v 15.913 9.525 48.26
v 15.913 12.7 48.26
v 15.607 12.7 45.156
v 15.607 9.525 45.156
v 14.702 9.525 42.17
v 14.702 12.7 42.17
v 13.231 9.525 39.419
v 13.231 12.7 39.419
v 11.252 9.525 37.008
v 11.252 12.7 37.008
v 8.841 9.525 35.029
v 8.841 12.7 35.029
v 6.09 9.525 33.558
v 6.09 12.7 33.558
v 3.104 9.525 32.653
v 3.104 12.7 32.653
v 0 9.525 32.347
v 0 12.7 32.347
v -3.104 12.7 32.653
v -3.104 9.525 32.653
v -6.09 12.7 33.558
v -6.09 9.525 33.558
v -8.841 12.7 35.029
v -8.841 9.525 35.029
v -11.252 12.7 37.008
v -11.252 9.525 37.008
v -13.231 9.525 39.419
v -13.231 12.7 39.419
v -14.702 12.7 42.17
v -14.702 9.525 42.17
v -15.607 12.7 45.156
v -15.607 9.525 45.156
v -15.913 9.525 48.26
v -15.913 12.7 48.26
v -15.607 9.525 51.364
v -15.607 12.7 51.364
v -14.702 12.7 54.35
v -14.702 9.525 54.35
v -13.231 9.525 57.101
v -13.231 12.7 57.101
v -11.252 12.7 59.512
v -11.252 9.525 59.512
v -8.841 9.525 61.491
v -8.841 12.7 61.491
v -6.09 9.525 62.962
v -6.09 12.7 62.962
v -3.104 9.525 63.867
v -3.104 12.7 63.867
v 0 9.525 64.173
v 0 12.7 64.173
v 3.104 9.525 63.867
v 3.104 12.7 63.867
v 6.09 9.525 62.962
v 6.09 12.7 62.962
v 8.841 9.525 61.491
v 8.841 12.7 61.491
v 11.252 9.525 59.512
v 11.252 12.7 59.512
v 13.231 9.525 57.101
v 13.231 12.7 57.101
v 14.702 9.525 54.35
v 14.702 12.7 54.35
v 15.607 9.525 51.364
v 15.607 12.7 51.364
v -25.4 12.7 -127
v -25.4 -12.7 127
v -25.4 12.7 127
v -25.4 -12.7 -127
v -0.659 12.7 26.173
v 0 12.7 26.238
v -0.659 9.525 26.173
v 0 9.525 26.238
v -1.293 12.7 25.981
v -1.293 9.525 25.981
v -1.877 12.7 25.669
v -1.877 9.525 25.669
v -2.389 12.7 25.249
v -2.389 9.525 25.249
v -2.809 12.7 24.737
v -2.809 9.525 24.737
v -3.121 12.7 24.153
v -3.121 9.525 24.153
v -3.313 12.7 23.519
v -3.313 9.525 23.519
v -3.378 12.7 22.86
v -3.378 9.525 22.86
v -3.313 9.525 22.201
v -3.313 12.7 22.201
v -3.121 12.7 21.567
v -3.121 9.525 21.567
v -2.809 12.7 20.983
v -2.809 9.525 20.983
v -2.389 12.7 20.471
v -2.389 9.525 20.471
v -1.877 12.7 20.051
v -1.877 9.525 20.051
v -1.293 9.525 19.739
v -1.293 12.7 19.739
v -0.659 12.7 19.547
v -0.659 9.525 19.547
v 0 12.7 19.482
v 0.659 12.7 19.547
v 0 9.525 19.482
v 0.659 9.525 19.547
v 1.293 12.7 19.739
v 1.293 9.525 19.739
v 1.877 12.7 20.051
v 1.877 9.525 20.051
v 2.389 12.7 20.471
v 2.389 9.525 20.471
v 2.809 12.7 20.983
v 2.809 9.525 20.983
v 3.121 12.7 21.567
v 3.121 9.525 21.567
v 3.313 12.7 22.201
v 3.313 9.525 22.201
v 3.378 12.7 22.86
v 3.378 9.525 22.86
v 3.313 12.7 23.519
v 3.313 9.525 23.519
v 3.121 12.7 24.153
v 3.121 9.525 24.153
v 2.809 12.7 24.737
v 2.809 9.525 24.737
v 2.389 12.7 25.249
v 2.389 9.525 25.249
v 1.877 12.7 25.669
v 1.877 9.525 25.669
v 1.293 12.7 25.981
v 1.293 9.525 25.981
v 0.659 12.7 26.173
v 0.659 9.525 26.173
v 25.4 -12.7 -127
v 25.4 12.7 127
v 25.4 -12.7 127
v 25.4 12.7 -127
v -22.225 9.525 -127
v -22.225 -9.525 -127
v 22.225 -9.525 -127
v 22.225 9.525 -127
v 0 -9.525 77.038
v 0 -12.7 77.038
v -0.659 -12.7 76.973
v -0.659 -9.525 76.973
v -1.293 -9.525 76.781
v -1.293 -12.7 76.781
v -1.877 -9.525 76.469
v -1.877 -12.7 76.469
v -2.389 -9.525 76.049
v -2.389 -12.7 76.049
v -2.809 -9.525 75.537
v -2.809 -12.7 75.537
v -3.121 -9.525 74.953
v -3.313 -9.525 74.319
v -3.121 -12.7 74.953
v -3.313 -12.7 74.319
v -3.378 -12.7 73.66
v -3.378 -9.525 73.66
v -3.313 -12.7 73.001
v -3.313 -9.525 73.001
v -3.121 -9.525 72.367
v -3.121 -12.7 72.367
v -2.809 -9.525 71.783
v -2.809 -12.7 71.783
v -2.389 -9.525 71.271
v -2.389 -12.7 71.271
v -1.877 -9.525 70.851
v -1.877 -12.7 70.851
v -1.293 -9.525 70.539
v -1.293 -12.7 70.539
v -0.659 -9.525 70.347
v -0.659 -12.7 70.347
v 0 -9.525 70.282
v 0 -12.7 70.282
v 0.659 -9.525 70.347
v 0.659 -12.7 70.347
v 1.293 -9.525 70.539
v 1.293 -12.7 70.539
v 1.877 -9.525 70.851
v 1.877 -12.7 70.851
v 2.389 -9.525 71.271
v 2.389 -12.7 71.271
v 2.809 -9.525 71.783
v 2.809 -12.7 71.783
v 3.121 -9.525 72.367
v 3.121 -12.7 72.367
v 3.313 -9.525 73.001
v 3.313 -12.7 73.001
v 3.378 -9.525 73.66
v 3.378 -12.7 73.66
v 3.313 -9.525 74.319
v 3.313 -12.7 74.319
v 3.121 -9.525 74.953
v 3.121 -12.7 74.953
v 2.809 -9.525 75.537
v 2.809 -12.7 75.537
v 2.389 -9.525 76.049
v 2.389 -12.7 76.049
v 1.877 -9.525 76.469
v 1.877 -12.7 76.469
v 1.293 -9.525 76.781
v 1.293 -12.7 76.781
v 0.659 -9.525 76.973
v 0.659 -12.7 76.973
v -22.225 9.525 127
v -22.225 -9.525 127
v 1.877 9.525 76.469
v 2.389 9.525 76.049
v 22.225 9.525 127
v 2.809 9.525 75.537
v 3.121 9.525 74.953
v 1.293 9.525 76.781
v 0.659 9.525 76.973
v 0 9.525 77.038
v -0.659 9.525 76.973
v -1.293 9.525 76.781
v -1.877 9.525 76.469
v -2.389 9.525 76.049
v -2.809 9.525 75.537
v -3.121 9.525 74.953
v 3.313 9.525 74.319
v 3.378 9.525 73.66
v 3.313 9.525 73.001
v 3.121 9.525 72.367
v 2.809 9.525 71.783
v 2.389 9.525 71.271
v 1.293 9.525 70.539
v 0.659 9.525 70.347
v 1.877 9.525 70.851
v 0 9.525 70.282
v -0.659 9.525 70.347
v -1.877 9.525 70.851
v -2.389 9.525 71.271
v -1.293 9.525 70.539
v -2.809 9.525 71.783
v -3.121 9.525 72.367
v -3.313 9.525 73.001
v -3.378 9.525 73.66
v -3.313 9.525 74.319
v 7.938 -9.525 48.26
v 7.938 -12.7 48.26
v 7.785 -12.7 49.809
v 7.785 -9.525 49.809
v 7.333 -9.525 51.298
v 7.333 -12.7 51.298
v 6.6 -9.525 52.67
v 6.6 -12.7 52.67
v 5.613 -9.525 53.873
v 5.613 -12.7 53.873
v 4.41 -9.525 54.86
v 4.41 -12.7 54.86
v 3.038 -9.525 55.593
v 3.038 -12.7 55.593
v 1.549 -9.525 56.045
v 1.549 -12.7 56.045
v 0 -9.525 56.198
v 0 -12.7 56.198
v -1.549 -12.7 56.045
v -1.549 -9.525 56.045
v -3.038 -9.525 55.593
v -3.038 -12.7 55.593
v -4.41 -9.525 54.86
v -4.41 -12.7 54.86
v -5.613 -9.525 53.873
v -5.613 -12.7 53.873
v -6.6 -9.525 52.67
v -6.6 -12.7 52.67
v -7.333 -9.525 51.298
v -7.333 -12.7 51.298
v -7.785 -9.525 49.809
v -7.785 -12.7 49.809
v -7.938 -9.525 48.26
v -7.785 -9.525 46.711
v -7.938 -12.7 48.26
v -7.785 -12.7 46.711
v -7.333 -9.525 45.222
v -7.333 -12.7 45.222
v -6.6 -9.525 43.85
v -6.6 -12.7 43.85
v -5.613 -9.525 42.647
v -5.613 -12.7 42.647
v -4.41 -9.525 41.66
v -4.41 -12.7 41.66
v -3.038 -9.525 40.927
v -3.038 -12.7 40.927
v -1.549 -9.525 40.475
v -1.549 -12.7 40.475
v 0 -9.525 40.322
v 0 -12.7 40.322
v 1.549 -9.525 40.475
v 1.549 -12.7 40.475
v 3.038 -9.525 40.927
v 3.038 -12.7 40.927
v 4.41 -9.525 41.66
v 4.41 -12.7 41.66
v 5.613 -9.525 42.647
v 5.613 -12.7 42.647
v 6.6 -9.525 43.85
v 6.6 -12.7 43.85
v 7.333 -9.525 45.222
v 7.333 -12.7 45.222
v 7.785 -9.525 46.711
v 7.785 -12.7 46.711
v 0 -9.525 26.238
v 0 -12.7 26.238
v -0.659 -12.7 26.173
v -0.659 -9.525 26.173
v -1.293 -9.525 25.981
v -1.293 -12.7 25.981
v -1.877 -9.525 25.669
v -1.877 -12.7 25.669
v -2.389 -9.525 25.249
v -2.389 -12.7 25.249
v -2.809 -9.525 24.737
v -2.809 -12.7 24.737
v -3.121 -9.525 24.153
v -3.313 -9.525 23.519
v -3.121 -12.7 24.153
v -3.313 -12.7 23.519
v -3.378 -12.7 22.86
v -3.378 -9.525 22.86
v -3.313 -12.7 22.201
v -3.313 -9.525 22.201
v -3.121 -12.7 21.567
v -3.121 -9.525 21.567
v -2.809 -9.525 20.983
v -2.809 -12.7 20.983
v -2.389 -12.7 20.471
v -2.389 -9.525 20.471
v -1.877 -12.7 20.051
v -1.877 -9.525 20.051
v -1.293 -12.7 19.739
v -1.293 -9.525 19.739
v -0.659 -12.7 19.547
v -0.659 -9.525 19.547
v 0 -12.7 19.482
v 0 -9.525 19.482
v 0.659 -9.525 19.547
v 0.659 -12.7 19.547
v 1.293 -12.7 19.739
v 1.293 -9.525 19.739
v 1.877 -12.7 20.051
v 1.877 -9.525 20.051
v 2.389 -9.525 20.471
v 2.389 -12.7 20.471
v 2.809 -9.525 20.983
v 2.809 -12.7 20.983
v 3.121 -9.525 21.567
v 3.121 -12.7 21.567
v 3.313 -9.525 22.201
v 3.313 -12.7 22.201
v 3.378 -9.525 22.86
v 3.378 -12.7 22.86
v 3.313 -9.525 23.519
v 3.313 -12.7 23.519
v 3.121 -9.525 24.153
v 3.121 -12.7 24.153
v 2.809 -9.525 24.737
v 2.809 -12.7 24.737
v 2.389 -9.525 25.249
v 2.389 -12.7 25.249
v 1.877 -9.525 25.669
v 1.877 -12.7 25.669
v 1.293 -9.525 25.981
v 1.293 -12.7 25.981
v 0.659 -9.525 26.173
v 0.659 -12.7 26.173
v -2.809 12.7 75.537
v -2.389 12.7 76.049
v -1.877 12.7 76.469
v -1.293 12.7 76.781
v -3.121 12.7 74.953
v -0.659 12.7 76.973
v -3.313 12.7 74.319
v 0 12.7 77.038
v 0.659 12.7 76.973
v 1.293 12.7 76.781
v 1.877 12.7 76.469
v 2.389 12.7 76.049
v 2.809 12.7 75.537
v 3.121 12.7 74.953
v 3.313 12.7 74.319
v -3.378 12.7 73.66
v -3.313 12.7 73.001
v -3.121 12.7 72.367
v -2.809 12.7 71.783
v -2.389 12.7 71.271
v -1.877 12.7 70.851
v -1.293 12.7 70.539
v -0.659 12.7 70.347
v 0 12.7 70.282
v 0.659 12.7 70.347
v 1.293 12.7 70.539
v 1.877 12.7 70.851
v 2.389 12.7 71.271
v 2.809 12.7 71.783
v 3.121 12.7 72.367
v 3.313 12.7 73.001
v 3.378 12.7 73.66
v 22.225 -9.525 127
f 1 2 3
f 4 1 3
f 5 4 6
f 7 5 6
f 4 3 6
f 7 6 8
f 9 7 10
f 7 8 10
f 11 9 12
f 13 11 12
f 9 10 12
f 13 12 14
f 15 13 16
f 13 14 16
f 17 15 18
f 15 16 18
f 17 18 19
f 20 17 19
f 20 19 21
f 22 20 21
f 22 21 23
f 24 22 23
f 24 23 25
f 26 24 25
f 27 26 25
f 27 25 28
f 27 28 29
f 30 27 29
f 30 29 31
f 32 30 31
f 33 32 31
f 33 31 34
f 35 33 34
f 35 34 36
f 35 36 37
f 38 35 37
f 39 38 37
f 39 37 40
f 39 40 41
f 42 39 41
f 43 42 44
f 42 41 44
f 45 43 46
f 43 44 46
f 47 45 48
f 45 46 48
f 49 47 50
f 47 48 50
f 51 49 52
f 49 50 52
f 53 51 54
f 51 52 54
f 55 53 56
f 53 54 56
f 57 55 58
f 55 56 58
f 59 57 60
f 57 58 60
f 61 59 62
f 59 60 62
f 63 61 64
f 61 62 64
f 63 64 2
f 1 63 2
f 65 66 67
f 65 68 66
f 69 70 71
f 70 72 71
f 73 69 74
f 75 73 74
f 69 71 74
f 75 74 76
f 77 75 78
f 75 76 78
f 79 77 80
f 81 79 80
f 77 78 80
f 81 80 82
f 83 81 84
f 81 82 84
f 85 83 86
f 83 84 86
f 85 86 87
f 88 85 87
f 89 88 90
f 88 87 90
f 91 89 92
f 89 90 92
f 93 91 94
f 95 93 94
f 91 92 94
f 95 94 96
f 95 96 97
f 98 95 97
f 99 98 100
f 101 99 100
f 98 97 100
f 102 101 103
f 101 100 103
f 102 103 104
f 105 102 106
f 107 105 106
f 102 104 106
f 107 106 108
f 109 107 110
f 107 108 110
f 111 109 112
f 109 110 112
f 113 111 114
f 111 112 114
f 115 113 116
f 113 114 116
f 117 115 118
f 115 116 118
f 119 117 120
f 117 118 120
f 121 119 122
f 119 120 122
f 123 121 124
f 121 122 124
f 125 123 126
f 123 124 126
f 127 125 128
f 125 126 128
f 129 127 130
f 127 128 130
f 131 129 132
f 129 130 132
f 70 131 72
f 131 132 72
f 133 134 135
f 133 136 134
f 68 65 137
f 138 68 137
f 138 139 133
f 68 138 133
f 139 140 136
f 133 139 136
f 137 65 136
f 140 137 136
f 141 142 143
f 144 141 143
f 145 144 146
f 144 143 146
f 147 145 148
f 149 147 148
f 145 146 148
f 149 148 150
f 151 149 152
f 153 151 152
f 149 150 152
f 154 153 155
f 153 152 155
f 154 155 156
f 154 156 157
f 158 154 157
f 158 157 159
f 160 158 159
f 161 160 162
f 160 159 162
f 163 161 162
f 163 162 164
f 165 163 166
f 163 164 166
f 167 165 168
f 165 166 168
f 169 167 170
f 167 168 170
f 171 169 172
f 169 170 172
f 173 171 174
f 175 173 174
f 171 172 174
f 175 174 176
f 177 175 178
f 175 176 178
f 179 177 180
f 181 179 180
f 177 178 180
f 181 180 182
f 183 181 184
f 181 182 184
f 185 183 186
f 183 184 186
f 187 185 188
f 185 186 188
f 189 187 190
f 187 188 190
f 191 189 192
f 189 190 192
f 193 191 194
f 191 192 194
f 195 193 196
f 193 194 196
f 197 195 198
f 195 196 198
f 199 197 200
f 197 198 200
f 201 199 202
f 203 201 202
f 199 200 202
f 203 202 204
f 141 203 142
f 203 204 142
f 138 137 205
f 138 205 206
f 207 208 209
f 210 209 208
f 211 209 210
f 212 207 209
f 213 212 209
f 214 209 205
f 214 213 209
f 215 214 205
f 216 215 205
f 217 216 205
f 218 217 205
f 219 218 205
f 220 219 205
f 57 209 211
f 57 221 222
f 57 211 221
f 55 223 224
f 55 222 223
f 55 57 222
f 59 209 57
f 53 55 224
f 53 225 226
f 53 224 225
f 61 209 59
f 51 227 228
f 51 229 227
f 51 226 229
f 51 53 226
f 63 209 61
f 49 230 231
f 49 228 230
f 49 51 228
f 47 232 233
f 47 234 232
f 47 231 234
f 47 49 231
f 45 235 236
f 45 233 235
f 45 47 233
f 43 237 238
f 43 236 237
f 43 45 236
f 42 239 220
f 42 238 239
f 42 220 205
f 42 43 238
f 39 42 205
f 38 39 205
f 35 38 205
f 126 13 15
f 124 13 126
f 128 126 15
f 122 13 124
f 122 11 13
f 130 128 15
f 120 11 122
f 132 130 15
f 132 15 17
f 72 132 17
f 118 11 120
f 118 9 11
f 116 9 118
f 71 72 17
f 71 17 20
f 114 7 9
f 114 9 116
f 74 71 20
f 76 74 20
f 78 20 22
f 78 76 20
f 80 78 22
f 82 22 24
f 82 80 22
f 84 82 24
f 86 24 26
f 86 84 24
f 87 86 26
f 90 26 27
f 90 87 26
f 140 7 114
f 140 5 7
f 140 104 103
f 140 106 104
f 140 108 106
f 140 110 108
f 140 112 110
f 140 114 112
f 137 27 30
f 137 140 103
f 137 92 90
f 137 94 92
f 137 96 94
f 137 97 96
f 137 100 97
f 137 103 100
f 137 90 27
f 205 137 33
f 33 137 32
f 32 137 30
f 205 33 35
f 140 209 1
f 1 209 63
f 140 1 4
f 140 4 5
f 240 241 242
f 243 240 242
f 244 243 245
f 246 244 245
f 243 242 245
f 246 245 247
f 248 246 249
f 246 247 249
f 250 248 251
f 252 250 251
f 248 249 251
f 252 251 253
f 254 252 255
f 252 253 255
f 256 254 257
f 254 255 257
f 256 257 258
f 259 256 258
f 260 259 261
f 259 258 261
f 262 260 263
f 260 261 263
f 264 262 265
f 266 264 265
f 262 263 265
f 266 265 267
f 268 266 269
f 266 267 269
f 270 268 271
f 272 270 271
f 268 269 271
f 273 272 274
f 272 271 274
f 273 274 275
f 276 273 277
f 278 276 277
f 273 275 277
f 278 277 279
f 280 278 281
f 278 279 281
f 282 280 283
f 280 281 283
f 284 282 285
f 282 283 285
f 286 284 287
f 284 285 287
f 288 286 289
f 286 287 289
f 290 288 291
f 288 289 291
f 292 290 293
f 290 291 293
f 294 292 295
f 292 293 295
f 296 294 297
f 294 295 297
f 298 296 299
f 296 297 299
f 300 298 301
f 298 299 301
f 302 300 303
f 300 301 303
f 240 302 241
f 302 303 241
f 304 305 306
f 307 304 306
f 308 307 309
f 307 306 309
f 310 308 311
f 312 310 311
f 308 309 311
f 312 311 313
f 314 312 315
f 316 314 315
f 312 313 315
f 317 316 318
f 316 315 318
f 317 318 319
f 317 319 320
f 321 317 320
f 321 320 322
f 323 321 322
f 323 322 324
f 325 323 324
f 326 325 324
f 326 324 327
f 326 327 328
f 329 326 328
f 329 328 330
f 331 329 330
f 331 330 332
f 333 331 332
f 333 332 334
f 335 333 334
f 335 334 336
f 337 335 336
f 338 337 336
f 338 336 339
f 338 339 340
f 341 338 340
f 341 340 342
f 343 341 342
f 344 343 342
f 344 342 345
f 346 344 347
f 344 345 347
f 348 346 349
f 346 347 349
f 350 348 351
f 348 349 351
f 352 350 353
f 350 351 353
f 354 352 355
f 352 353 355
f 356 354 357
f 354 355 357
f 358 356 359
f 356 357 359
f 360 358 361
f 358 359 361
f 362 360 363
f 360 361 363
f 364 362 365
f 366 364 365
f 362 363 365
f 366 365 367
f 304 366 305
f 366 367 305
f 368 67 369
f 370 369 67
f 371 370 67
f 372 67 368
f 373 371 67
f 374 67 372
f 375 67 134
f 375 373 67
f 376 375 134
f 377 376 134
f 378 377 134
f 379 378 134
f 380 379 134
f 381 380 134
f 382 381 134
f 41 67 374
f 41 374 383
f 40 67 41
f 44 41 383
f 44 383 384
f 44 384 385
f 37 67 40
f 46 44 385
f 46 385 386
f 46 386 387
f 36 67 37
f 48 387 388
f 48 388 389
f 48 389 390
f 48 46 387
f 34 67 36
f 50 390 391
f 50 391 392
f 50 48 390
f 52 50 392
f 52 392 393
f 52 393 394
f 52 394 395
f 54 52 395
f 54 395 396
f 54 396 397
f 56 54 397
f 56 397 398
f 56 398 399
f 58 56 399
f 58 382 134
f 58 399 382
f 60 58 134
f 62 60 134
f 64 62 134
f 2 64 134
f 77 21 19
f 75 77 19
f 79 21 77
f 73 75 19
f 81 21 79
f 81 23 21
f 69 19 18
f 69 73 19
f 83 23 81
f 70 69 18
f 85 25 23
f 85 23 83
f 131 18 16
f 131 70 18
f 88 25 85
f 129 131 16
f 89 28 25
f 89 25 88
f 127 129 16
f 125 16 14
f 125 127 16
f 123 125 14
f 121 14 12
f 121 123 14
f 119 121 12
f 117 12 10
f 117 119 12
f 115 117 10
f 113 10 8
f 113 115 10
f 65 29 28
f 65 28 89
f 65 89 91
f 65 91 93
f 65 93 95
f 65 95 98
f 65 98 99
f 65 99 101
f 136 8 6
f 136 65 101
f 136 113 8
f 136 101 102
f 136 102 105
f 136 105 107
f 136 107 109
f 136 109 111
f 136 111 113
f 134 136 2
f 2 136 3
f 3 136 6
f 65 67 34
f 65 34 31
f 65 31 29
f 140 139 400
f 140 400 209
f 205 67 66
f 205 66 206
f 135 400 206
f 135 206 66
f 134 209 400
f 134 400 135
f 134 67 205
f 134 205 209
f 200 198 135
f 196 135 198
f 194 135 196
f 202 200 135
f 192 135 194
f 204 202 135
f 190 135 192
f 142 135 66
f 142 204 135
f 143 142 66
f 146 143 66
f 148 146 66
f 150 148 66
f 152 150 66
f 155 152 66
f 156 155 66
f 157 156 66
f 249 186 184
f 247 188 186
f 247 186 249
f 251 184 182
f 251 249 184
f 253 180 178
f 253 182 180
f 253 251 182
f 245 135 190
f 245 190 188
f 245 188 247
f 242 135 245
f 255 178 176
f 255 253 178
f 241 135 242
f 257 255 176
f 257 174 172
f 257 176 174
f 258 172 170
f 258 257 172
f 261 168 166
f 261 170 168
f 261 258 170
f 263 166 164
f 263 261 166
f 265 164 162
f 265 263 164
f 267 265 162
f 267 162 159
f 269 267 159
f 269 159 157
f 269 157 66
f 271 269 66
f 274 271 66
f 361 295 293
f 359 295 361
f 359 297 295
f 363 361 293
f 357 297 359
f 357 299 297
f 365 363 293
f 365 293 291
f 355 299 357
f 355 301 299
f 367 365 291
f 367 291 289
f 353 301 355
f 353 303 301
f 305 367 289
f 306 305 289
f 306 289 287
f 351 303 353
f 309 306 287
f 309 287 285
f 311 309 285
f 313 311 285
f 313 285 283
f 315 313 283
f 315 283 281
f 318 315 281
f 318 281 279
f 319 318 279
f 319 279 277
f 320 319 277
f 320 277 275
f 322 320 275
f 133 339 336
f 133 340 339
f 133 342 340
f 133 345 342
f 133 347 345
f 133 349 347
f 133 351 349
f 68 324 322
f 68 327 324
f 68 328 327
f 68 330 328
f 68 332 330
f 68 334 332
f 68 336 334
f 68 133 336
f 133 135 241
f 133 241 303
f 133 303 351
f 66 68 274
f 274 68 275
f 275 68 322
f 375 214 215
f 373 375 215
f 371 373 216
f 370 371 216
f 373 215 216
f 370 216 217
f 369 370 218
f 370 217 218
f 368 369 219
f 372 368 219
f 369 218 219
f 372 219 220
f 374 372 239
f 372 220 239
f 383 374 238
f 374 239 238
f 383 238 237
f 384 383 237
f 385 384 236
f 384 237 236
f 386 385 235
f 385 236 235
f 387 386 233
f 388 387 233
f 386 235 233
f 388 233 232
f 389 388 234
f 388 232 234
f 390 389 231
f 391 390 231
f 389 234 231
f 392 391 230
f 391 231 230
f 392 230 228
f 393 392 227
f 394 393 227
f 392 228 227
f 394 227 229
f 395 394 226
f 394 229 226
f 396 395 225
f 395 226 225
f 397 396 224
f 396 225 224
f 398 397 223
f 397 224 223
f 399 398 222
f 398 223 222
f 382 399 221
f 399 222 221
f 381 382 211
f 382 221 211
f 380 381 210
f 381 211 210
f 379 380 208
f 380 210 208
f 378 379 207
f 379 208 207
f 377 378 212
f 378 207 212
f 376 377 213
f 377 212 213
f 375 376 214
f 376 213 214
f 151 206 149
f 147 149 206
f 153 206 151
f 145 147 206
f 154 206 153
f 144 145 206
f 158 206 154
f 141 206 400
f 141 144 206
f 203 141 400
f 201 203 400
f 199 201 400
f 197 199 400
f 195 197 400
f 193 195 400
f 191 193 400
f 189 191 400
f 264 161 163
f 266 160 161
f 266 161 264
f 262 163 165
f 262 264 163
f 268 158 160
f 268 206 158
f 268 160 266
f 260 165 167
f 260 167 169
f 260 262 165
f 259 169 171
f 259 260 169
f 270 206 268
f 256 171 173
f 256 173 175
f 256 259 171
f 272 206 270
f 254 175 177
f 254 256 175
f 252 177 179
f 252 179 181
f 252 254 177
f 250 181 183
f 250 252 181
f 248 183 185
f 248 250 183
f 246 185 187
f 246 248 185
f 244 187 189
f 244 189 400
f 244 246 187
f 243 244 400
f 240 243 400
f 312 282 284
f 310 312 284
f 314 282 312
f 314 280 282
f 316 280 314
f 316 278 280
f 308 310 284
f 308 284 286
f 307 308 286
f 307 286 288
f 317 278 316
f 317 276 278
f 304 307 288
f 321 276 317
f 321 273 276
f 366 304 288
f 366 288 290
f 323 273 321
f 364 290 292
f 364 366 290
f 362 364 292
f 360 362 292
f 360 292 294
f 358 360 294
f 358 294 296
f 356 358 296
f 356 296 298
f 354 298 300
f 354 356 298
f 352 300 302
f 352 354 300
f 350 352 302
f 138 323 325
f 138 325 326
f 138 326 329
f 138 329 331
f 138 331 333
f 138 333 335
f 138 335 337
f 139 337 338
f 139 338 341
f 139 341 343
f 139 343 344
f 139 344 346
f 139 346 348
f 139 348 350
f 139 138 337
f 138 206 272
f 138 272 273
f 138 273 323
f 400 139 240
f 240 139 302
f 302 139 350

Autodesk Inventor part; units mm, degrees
ref_plane "YZ Plane" through (0, 0, 0) normal (1, 0, 0) x (0, 1, 0)
ref_plane "XZ Plane" through (0, 0, 0) normal (0, 1, 0) x (-1, 0, 0)
ref_plane "XY Plane" through (0, 0, 0) normal (0, 0, 1) x (1, 0, 0)
sketch "Sketch1" plane through (0, 0, 0) normal (0, 0, 1) x (1, 0, 0)
  line L0 (-35.56, 0) -> (35.56, 0) projected
  line L1 (0, -17.78) -> (0, 17.78) projected
  line L2 (-25.4, 12.7) -> (25.4, 12.7)
  line L3 (25.4, 12.7) -> (25.4, -12.7)
  line L4 (25.4, -12.7) -> (-25.4, -12.7)
  line L5 (-25.4, -12.7) -> (-25.4, 12.7)
  line L6 (22.225, 9.525) -> (-22.225, 9.525)
  line L7 (-22.225, 9.525) -> (-22.225, -9.525)
  line L8 (-22.225, -9.525) -> (22.225, -9.525)
  line L9 (22.225, -9.525) -> (22.225, 9.525)
  point P0 (0, 0)
  point P1 (-25.4, 0)
  point P2 (0, 12.7)
  dimension "d0" = 25.4
  dimension "d1" = 3.175
  dimension "d7" = 50.8
extrude "Extrusion1" add sketch "Sketch1" along normal mid plane 254 contours L5 L2 L1 L6 L7 L0 | L0 L7 L8 L1 L4 L5 | L1 L8 L9 L0 L3 L4 | L2 L3 L0 L9 L6 L1
sketch "Sketch3" plane through (-25.4, 12.7, 127) normal (0, 1, 0) x (1, 0, 0)
  line L0 (0, 0) -> (50.8, 0) projected
  circle A0 centre (25.4, 78.74) radius 15.9131
  point P0 (25.4, 127)
  dimension "d8" = 31.8262
  dimension "d9" = 78.74
extrude "Extrusion3" cut sketch "Sketch3" against normal up to surface (3.175 mm away)
sketch "Sketch4" plane through (-25.4, -12.7, 127) normal (0, -1, 0) x (1, 0, 0)
  line L0 (50.8, 0) -> (0, 0) projected
  circle A0 centre (25.4, -78.74) radius 7.9375
  point P0 (25.4, -127)
  dimension "d12" = 15.875
  dimension "d13" = 78.74
extrude "Extrusion4" cut sketch "Sketch4" against normal up to surface (3.175 mm away)
sketch "Sketch5" plane through (-25.4, 12.7, 127) normal (0, 1, 0) x (1, 0, 0)
  circle A0 centre (25.4, 78.74) radius 15.9131 projected
  point P0 (25.4, 127)
  point P1 (25.4, 104.14)
  point P2 (25.4, 53.34)
  dimension "d16" = 25.4
  dimension "d17" = 25.4
hole "Hole1" at (0, 12.7, 22.86) at (0, 12.7, 73.66) direction (0, -1, 0) diameter 6.7564 end through all clearance for "Flat Head Machine Screw (82)" size "1/4" standard "Ansi Unified Screw Threads"
equation "\"d17\" = d16"
properties part number "tubing_template_0.125" material "Aluminum-6061"
